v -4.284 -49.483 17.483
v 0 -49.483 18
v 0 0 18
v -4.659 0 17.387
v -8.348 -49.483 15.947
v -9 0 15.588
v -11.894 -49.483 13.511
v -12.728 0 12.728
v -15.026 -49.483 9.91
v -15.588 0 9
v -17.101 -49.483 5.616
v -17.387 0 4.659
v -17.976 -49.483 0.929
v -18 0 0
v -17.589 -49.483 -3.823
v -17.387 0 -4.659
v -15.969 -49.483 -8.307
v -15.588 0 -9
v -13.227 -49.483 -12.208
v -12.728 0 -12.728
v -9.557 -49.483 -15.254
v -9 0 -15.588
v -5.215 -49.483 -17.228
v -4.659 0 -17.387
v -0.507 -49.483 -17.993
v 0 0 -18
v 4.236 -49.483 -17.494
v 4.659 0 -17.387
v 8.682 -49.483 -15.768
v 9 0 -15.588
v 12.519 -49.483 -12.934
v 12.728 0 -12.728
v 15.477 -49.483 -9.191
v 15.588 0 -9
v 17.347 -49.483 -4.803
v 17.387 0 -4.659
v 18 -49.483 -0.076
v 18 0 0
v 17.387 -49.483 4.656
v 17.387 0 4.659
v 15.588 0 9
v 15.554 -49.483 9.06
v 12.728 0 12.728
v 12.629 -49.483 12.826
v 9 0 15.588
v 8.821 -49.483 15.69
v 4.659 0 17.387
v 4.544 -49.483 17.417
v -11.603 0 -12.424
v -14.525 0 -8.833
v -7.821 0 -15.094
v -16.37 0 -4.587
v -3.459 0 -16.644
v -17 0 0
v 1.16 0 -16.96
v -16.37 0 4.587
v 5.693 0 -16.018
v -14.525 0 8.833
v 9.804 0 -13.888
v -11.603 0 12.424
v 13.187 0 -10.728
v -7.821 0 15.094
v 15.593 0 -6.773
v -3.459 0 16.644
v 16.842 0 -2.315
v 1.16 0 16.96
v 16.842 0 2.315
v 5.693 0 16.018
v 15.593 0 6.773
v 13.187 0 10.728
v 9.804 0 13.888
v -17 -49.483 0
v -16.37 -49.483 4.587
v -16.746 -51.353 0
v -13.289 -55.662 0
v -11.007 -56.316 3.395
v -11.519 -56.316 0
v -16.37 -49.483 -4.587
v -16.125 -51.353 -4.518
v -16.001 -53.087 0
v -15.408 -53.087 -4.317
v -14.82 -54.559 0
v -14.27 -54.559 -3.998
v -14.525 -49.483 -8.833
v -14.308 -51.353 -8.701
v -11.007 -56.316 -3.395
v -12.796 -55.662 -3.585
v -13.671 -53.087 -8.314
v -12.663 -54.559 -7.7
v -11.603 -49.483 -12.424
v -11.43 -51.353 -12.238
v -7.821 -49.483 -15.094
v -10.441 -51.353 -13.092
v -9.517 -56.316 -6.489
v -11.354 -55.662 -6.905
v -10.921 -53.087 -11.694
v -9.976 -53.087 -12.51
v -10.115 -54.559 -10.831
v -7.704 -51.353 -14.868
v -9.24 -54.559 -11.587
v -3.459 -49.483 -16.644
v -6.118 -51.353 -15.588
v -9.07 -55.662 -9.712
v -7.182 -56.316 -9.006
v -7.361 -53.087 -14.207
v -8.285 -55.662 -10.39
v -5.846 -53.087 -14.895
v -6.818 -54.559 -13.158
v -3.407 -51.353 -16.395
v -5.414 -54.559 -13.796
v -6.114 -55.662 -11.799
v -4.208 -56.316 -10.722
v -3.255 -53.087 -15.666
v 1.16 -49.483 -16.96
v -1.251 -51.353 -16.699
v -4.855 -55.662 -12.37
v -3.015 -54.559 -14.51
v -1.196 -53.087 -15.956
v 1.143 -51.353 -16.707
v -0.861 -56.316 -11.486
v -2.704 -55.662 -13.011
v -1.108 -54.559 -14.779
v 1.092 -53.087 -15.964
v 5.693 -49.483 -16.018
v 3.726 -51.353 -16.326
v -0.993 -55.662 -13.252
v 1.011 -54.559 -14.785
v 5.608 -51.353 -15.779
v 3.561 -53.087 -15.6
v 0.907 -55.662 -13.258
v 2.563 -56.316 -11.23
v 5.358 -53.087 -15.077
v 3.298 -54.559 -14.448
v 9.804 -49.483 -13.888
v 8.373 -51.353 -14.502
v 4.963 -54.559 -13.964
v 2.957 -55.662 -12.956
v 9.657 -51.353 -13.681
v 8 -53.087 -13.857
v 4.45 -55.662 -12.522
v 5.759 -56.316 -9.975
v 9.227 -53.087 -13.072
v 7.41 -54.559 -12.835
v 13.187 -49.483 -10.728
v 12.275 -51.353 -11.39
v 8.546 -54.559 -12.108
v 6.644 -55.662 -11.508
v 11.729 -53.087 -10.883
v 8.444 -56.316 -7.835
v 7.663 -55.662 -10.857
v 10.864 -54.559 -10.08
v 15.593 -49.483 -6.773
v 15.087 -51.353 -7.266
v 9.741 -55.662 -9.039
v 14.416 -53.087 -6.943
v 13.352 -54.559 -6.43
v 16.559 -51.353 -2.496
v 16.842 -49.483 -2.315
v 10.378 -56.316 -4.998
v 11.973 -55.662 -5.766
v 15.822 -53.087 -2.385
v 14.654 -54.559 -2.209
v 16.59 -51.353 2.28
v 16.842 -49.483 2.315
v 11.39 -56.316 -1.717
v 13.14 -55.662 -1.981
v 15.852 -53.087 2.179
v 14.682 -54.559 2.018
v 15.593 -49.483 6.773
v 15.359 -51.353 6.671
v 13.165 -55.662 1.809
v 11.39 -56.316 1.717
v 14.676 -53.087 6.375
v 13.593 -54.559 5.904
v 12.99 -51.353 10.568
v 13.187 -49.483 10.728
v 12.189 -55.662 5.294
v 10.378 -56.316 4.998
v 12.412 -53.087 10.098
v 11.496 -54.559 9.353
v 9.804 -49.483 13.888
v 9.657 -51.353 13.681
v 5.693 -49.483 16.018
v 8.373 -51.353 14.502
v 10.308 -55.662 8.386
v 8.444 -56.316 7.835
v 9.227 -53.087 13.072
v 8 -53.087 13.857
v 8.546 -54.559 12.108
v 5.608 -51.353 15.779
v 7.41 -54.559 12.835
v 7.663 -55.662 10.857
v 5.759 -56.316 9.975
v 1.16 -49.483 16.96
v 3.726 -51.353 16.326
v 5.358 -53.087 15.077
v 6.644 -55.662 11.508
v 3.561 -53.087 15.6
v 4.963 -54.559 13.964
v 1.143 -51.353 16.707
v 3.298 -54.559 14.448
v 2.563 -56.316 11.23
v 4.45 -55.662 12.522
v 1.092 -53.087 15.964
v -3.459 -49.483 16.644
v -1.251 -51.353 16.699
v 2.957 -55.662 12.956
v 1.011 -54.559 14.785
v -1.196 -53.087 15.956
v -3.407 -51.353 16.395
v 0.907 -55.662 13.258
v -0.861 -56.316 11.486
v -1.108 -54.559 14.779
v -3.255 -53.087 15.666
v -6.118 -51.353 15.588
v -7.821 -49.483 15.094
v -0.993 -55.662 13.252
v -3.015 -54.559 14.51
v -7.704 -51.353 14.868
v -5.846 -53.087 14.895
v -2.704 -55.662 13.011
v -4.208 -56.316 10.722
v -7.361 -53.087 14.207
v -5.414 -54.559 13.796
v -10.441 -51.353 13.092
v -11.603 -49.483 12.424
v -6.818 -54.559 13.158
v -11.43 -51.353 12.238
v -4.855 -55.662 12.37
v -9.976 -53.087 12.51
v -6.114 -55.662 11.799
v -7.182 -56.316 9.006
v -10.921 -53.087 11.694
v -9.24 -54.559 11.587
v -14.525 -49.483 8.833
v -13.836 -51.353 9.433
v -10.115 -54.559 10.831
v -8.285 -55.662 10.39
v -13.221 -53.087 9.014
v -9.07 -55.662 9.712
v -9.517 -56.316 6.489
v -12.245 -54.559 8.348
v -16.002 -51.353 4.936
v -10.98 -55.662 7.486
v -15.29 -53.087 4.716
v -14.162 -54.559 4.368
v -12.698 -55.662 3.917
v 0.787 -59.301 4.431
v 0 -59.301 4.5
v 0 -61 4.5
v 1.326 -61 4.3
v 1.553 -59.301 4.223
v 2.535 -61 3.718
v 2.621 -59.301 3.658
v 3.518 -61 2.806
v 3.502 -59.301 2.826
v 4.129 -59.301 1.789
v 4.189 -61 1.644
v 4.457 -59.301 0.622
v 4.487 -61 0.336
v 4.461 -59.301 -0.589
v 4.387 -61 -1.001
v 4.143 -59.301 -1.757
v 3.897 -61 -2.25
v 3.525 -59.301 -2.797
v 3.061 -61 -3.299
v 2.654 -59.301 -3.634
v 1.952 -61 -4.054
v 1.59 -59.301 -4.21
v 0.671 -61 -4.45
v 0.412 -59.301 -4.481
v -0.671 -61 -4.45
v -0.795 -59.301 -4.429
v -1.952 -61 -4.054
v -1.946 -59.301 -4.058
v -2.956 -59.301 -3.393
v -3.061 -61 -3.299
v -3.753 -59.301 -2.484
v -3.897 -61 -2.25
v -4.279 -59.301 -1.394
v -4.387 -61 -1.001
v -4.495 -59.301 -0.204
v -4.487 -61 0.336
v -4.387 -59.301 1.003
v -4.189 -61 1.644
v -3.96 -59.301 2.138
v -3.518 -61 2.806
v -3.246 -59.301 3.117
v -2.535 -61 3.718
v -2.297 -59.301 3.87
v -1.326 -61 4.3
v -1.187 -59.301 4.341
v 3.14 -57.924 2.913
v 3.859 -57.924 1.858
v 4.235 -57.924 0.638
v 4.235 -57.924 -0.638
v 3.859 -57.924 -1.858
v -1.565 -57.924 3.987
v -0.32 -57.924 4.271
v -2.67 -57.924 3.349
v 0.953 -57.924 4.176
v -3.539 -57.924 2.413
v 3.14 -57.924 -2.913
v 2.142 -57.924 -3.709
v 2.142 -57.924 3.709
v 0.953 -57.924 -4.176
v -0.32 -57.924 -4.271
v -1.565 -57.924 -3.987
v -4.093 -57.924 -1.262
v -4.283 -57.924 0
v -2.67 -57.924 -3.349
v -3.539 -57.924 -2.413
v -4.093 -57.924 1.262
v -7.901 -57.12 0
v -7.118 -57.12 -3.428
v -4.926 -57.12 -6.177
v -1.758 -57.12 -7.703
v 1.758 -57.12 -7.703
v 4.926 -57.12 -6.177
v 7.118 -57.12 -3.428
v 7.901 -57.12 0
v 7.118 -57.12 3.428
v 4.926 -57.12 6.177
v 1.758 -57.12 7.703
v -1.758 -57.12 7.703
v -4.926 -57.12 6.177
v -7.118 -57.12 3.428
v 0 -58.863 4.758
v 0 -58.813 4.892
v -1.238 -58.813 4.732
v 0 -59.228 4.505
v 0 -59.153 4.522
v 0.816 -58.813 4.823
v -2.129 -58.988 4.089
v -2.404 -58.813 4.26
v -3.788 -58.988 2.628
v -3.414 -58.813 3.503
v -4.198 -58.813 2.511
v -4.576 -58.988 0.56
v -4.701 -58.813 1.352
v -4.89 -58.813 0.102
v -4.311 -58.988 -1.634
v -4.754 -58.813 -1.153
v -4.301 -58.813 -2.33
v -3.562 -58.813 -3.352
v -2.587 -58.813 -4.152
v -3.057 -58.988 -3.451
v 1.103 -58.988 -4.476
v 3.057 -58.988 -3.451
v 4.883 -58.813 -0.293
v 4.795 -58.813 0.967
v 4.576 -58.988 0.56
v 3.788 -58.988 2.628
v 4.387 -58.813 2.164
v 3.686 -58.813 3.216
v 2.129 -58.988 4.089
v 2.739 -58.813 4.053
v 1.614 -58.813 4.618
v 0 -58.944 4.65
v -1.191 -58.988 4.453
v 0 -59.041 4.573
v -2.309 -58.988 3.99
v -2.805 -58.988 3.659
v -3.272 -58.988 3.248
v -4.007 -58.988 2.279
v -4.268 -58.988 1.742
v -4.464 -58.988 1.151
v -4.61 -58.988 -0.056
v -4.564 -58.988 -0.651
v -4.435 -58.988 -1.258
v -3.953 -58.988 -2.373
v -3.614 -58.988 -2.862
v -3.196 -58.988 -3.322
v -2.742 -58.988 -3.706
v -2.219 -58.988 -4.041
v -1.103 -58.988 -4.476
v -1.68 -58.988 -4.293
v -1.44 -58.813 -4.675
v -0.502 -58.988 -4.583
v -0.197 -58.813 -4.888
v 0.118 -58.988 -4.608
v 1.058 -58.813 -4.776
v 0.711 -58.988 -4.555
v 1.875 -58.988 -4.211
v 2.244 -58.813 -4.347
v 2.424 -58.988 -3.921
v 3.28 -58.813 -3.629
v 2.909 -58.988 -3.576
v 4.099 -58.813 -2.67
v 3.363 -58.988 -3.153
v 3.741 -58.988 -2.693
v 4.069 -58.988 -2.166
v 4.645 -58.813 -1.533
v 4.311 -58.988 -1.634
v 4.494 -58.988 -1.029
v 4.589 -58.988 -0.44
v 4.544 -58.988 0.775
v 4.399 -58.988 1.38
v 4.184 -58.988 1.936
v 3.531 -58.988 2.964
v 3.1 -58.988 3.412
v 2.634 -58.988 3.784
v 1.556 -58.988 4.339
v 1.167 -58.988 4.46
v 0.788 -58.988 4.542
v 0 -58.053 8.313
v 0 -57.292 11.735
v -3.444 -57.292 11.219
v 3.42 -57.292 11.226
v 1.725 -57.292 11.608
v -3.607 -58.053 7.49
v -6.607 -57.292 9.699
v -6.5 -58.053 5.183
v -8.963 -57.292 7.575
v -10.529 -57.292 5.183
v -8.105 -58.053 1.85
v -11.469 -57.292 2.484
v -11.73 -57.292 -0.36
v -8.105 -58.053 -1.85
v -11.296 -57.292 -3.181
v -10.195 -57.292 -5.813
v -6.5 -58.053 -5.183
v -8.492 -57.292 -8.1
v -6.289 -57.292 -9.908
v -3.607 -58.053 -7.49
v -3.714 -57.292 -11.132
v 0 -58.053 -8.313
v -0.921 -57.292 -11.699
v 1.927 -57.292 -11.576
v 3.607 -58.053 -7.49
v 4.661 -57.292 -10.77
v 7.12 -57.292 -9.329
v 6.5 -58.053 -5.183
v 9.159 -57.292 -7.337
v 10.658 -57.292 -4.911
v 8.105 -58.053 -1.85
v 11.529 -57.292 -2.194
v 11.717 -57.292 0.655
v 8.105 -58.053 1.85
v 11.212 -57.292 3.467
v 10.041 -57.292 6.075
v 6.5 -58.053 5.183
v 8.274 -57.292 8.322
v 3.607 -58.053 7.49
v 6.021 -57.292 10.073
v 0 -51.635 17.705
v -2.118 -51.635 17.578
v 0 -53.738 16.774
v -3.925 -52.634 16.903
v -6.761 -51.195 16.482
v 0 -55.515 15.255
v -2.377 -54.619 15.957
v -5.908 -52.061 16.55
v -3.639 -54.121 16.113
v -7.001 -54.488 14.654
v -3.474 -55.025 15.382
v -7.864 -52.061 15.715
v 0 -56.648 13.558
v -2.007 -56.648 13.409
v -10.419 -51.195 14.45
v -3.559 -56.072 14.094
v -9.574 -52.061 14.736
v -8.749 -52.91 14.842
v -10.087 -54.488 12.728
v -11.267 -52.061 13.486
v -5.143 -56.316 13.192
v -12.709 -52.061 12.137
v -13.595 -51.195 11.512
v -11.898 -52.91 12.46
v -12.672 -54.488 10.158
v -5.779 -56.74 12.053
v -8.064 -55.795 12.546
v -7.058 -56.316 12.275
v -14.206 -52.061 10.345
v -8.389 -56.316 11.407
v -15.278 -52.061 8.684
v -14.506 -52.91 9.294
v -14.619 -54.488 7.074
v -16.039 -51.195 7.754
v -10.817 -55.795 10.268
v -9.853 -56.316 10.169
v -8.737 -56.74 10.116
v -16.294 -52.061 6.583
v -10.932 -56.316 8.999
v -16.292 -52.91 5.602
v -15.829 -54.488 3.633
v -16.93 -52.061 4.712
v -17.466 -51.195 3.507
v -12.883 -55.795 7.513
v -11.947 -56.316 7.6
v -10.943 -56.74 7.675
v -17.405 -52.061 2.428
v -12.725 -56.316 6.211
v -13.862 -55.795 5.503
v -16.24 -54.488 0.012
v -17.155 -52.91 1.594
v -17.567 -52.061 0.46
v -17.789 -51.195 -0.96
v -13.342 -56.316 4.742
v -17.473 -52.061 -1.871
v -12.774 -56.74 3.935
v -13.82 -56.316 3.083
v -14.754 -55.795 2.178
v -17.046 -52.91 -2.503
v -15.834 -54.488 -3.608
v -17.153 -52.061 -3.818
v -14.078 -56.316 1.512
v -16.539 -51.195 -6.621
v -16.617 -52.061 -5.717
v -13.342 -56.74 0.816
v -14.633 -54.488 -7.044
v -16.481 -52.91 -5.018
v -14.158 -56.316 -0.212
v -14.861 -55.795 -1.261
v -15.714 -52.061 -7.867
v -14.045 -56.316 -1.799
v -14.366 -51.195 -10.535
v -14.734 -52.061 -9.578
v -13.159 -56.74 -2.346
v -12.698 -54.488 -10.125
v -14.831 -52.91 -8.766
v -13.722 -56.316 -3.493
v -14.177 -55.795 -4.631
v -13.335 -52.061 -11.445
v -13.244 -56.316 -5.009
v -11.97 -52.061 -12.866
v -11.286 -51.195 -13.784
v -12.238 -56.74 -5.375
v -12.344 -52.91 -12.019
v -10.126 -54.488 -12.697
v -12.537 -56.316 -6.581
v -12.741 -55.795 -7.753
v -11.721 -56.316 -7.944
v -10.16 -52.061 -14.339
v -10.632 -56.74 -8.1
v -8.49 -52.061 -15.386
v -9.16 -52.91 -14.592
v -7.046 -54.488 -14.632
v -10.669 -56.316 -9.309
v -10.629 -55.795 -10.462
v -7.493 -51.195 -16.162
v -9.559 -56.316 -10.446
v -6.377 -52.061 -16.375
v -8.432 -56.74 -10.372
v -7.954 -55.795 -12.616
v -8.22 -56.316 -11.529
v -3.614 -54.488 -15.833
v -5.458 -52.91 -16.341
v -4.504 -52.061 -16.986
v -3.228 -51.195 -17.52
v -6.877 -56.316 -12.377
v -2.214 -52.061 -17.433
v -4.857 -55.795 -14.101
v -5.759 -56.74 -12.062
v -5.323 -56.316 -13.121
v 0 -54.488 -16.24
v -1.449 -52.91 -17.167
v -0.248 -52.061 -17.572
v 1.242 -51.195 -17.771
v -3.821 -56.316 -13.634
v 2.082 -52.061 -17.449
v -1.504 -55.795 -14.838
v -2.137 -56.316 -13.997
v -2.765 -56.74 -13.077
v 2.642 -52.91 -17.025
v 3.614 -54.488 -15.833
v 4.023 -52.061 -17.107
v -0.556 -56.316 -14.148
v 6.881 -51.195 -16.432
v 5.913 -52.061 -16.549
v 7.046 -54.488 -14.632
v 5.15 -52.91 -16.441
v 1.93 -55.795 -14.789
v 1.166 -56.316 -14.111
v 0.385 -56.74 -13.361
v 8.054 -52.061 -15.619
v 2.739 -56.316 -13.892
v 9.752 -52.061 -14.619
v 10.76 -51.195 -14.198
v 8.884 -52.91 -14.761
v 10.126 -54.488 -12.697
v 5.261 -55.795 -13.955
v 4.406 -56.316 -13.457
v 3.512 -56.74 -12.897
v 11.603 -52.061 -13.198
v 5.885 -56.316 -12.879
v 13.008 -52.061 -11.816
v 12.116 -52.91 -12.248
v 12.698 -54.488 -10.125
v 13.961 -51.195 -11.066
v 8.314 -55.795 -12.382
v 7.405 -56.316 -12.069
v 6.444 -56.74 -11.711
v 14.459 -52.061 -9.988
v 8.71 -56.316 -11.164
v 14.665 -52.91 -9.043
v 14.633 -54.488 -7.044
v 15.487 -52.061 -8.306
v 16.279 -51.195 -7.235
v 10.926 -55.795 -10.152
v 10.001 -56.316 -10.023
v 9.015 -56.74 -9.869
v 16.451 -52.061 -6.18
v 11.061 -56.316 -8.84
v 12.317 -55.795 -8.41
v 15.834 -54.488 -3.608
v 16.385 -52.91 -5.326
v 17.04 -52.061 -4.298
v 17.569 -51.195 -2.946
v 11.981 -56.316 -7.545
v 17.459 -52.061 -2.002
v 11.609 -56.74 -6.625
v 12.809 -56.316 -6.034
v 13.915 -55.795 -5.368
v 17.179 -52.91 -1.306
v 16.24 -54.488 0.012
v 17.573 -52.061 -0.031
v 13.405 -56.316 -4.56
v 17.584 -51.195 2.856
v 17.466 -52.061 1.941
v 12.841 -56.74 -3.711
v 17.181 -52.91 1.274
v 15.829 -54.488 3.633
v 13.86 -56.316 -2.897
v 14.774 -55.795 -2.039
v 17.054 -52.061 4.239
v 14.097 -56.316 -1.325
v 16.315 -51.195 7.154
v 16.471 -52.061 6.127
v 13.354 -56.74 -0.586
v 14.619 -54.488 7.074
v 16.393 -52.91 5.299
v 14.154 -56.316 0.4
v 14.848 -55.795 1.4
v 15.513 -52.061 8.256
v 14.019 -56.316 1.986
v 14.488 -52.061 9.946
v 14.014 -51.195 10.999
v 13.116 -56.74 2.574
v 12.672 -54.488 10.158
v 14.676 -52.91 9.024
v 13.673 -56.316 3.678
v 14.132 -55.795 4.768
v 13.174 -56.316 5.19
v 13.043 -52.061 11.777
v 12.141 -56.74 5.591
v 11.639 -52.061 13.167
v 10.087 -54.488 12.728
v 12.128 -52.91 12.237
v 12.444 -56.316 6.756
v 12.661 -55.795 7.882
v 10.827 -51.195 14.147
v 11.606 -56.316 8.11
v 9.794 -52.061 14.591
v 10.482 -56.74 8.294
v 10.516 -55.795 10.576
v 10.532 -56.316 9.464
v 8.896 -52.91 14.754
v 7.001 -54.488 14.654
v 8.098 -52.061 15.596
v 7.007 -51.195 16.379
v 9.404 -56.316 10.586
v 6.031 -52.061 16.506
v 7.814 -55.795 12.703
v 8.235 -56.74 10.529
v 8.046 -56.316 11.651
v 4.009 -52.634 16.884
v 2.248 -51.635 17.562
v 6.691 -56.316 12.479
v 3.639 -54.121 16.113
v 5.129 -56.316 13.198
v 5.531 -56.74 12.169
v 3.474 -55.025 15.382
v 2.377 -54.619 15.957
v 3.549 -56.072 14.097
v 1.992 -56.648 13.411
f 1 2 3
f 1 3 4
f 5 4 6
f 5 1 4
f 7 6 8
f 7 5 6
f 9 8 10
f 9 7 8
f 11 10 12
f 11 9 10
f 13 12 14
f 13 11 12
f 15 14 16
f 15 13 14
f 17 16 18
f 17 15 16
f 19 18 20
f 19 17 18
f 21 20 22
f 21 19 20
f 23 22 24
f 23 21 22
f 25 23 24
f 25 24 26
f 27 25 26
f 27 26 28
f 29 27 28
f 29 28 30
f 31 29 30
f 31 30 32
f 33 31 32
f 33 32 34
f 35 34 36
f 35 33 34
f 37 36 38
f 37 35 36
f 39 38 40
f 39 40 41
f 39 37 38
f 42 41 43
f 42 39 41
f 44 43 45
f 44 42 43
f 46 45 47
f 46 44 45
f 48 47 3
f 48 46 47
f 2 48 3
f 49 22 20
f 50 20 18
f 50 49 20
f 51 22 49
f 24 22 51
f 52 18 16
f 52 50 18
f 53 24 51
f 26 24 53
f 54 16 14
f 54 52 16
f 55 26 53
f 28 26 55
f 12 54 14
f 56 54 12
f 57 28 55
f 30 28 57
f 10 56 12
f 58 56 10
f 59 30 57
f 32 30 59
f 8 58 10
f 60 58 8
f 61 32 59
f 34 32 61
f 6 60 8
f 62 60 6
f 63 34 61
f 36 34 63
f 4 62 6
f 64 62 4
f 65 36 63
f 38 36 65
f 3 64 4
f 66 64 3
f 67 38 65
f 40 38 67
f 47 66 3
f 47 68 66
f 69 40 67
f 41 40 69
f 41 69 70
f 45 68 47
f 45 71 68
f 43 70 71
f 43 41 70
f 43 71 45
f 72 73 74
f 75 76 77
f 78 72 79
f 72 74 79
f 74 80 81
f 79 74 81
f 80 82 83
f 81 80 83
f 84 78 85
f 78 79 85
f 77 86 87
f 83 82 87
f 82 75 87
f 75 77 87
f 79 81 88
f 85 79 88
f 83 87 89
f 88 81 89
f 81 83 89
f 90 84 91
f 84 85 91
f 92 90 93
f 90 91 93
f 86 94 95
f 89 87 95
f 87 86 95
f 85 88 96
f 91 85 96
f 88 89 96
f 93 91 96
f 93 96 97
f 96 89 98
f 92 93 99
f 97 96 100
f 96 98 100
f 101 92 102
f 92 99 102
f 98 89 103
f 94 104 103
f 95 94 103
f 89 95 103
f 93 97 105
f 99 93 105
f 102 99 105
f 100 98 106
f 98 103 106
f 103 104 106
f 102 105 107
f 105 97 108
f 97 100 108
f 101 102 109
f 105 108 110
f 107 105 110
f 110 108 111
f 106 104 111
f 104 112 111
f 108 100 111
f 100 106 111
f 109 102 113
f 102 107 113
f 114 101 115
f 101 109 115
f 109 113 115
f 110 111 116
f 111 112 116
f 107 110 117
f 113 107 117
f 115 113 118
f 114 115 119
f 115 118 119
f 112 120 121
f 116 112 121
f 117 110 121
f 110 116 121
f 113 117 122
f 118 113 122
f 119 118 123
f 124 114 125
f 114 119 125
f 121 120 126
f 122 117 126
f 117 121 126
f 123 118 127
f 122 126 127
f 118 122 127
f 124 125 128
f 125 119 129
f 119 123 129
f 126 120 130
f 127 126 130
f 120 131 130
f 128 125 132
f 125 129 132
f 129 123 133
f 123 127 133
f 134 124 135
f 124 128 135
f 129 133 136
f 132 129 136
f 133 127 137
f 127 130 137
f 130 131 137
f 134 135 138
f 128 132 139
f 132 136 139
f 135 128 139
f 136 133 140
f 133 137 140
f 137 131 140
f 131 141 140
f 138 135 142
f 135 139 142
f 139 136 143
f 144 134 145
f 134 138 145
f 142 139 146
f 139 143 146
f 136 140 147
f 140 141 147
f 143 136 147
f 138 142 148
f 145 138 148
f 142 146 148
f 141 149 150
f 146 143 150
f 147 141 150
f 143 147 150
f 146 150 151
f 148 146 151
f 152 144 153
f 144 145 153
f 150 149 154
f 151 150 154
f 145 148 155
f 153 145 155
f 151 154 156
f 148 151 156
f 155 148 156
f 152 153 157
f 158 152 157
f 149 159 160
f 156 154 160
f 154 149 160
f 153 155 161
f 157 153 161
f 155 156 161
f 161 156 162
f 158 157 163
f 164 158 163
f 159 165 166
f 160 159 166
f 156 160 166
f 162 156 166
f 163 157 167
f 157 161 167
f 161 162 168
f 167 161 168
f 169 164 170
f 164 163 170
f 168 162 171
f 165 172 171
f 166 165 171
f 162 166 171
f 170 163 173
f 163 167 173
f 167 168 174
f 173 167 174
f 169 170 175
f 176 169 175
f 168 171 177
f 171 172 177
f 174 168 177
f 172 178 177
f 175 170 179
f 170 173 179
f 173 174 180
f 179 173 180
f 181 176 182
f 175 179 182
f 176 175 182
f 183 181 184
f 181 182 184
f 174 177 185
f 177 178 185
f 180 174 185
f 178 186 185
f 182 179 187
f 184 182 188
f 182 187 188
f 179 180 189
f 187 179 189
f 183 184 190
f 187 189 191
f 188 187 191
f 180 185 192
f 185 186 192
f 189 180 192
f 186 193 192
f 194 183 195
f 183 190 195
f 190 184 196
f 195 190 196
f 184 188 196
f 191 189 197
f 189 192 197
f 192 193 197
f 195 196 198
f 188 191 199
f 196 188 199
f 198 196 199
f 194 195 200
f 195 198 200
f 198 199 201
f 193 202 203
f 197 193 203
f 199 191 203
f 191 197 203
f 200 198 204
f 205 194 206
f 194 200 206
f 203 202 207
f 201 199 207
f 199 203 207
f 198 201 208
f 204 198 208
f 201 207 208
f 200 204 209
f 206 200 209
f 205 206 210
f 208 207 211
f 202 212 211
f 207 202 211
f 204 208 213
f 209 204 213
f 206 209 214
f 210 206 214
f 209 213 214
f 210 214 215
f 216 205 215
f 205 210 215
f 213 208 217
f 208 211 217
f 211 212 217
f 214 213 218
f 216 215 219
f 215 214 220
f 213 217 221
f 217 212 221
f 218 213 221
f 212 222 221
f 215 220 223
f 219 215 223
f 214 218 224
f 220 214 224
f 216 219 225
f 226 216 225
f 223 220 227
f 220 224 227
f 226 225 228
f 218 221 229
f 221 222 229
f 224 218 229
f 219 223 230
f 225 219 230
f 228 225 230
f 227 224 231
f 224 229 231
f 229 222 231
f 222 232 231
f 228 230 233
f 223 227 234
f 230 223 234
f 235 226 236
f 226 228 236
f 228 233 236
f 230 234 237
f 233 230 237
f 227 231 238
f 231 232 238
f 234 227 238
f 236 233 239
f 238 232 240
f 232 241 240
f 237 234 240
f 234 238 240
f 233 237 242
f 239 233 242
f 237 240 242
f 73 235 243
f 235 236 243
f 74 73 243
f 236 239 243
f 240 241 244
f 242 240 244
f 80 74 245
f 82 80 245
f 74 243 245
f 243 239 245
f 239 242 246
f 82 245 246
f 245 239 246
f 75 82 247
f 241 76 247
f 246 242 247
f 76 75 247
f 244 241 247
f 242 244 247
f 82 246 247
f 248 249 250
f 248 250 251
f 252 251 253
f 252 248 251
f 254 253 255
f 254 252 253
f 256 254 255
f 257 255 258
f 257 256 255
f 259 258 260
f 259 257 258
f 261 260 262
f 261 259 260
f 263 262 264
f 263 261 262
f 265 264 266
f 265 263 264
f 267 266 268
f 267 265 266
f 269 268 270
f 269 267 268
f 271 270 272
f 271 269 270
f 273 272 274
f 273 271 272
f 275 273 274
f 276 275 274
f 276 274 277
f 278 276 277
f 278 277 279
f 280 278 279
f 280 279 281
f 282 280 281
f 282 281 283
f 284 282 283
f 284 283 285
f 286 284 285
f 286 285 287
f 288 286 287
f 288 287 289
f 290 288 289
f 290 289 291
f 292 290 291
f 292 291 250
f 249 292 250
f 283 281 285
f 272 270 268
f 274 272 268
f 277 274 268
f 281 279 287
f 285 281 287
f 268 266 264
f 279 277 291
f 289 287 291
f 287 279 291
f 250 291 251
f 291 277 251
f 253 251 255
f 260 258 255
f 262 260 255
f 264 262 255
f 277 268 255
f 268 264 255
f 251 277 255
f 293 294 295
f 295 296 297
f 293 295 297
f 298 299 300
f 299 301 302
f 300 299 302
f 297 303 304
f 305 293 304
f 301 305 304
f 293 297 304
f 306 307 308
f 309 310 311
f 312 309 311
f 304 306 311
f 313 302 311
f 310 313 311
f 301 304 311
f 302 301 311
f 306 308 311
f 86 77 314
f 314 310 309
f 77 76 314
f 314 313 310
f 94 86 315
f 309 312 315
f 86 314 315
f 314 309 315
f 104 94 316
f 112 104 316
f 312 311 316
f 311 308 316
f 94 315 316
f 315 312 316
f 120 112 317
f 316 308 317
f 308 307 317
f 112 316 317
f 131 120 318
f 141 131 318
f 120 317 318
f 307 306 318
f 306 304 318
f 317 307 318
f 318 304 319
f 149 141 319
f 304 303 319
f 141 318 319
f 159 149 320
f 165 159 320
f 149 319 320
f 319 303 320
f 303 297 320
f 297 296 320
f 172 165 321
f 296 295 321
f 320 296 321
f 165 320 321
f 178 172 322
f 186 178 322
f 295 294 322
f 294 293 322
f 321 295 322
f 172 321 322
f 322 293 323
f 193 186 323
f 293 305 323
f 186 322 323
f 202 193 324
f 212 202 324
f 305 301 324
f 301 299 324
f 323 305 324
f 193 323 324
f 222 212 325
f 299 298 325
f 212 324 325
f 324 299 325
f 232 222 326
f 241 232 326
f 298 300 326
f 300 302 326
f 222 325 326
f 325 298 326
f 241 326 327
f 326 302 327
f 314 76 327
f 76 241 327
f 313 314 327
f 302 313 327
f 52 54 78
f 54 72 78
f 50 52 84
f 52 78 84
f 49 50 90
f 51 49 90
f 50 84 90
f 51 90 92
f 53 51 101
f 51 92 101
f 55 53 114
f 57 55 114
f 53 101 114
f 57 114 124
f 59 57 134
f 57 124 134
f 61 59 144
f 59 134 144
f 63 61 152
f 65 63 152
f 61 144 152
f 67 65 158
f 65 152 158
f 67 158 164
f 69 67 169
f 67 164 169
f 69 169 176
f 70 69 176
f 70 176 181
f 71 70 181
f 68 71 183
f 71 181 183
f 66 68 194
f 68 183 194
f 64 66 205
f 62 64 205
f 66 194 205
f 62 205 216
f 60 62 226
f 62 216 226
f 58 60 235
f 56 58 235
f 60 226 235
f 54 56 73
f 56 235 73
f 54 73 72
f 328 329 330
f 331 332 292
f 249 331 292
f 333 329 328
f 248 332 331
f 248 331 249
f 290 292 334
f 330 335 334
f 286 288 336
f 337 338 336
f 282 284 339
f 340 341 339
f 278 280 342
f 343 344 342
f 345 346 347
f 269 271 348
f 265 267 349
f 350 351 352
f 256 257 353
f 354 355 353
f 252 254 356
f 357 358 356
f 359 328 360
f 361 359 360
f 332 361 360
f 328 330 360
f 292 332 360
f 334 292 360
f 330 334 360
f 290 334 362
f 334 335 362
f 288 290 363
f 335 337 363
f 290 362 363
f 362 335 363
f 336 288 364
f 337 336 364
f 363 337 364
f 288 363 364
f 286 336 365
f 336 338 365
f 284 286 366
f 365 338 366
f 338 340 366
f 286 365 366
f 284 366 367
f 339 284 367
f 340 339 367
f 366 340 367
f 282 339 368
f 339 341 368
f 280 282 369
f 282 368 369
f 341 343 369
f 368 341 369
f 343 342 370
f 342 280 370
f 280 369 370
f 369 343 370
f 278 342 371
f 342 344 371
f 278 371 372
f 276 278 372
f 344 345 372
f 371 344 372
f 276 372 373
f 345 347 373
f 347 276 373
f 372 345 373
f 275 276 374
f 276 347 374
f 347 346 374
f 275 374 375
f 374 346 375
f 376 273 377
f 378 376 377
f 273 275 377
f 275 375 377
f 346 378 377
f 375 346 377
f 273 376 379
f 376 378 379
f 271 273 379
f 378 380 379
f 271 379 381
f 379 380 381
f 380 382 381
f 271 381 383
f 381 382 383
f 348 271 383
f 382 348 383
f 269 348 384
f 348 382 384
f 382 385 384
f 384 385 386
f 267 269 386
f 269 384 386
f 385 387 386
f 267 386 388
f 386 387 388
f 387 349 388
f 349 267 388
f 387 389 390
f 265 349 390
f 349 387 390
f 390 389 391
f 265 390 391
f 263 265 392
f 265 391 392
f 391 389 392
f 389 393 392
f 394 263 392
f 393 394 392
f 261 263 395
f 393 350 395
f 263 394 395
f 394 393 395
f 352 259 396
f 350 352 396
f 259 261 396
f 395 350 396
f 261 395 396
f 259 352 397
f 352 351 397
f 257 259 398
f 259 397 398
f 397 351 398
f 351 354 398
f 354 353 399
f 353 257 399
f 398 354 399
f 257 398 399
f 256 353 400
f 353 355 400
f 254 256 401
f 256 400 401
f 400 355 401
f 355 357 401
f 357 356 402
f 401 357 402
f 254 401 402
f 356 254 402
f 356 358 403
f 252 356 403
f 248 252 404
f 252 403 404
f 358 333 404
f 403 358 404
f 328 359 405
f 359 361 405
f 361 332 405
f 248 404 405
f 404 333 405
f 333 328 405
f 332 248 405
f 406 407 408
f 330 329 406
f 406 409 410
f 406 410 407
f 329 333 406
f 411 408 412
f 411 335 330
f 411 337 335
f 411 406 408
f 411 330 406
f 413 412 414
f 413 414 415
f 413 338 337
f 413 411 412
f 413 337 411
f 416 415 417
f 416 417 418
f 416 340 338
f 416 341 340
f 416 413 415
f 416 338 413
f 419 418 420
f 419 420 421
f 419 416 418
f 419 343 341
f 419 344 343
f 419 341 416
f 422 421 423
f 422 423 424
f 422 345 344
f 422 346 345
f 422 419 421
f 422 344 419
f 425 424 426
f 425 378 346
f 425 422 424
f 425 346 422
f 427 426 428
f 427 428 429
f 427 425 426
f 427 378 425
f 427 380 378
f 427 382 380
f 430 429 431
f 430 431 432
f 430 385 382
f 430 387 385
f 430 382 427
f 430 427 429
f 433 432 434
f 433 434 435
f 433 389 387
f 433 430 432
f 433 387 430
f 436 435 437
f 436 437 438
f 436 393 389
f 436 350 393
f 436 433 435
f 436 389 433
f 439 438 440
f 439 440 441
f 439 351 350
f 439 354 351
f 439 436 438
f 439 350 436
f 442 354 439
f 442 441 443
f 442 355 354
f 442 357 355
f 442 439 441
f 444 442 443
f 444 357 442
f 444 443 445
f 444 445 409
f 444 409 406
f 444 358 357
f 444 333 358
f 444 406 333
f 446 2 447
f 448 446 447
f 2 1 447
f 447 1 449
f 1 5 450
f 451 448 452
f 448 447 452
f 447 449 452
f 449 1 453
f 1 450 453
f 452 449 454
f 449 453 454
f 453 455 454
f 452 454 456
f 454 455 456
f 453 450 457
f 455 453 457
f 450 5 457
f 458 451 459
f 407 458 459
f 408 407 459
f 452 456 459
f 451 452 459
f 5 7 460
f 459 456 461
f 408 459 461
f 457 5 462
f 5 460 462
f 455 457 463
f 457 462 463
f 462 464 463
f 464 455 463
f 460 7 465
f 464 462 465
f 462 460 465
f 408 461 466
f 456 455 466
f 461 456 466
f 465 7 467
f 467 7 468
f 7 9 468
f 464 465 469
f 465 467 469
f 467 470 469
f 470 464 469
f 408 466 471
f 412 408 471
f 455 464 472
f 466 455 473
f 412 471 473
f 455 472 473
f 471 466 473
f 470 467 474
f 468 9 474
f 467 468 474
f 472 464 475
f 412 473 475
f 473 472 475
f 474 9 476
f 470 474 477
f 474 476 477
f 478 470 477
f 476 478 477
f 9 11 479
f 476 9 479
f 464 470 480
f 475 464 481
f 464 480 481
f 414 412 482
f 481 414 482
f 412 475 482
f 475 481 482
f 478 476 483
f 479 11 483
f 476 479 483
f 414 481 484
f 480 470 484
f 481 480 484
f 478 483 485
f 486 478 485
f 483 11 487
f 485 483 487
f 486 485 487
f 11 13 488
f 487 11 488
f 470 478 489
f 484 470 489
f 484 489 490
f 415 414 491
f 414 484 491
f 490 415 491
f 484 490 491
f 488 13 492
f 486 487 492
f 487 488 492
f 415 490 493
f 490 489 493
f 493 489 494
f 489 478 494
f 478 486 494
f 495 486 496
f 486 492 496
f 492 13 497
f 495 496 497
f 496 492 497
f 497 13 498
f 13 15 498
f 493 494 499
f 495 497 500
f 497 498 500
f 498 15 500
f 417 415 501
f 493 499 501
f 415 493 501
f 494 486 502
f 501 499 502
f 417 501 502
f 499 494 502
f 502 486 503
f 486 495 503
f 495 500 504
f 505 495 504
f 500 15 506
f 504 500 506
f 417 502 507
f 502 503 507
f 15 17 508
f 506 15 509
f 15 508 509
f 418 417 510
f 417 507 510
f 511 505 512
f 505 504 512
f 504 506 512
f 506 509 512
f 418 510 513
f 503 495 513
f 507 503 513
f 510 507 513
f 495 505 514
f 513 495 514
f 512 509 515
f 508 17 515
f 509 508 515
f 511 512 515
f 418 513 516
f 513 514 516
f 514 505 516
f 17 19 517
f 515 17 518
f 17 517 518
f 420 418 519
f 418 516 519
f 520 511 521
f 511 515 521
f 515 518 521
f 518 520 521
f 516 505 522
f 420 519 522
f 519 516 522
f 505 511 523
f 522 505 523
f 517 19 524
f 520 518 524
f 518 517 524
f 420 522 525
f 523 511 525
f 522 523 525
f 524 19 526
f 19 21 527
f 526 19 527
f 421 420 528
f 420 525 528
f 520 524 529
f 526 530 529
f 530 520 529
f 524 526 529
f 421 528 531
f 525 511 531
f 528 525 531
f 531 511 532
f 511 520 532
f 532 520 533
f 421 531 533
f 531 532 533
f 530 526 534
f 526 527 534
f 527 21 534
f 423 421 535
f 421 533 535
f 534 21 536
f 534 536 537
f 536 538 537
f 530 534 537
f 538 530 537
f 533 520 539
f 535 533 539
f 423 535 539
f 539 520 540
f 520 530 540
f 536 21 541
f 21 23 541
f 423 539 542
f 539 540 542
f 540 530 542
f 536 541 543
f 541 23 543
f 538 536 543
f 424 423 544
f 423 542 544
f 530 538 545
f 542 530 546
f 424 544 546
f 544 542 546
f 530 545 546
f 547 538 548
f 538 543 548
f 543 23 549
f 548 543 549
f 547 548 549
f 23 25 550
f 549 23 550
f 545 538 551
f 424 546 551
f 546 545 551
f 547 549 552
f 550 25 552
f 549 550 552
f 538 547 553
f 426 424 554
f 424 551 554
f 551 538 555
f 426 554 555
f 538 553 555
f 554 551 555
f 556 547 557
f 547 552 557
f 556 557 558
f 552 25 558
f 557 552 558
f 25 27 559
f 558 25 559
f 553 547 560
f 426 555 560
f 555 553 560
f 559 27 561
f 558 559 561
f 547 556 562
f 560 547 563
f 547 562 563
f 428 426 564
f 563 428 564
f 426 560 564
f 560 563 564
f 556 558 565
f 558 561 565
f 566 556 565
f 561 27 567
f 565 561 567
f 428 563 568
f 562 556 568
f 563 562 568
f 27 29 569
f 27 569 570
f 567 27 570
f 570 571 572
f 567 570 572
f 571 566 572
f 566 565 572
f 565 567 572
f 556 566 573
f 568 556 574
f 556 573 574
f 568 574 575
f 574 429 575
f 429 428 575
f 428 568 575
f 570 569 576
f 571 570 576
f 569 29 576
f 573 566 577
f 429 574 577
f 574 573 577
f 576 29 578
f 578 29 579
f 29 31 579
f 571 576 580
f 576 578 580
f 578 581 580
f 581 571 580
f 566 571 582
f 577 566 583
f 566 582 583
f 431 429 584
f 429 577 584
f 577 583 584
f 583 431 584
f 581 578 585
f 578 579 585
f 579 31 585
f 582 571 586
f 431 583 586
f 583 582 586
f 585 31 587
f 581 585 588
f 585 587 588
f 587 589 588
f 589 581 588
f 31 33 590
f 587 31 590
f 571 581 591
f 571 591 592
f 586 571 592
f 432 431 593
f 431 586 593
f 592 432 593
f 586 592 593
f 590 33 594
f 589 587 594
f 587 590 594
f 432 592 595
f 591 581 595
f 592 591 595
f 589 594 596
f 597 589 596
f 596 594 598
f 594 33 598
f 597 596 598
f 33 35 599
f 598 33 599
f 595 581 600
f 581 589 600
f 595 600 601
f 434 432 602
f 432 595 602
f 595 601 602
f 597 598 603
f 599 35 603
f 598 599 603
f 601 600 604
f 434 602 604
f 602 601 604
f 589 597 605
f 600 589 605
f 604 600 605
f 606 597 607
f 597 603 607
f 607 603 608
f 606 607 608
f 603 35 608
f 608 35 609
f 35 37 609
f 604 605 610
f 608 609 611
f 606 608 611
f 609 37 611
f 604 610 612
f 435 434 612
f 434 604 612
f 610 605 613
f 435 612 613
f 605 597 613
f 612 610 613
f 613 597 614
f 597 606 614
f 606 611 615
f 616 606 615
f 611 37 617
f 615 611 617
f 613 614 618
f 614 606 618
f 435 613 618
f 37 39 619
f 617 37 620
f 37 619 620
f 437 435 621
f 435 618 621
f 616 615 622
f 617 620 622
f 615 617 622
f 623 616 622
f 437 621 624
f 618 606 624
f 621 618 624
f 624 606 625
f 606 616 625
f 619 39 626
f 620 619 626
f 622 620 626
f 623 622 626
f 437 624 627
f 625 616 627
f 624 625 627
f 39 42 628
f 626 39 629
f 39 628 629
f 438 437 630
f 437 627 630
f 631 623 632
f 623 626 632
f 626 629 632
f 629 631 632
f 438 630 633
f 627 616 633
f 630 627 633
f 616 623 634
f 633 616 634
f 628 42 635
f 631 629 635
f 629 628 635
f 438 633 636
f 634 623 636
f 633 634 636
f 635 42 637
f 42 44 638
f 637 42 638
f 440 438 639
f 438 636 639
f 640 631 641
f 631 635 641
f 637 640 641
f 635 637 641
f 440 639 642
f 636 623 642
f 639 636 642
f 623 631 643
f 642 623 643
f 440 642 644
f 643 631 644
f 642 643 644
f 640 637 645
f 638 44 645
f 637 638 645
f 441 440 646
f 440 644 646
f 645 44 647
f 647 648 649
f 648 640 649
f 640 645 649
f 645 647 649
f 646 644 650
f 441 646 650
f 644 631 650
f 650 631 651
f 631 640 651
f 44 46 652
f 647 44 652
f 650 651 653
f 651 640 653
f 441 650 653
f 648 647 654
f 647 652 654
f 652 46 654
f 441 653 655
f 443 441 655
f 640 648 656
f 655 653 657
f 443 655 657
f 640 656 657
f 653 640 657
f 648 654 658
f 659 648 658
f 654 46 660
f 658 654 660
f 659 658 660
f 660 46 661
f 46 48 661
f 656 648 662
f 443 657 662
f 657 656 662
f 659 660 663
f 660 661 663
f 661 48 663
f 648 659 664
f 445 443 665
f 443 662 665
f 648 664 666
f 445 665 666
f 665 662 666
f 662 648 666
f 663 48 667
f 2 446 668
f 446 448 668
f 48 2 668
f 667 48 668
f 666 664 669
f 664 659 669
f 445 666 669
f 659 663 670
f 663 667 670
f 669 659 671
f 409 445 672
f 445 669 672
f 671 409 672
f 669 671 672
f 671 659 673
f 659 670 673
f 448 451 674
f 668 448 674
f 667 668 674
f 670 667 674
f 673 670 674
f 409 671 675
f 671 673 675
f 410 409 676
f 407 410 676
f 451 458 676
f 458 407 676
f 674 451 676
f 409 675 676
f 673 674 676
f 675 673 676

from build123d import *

# Parameters (mm, degrees)
NECK_SKETCH_R = 4.5
NECK_DEPTH    = 61
TOP_ROUND_R   = 8
BLEND_R       = 0.5


with BuildPart() as part:
    # Outside Profile_Sketch → Outside Profile (revolve)
    with BuildSketch(Plane.XY):
        Polygon((0, 0), (-18, 0), (-18, -55.9), (-4.5, -58.9), (0, -58.9), align=None)
    revolve(axis=Axis((0, 0, 0), (0, -1, 0)))

    # Neck_Sketch → Neck (add)
    with BuildSketch(Plane(origin=(0, 0, 0), x_dir=(1, 0, 0), z_dir=(0, 1, 0))):
        Circle(NECK_SKETCH_R)
    extrude(amount=-NECK_DEPTH)

    # Top Round
    top_round_edges = [part.edges().sort_by_distance(p)[0] for p in [
        (18, -55.9, 0),
    ]]
    fillet(top_round_edges, radius=TOP_ROUND_R)

    # Blend
    blend_edges = [part.edges().sort_by_distance(p)[0] for p in [
        (0, -58.9, -4.5),
    ]]
    fillet(blend_edges, radius=BLEND_R)

    # Shell_Sketch → Shell (revolve, cut)
    with BuildSketch(Plane.XY):
        with BuildLine():
            Line((-4.283069542, -57.92381294), (0, -57.92381294))
            Line((0, -57.92381294), (0, 0))
            Line((0, 0), (-17, 0))
            Line((-17, 0), (-17, -49.482627149))
            ThreePointArc((-17, -49.482627149), (-15.460292686, -53.862718904), (-11.518513205, -56.31593657))
            Line((-11.518513205, -56.31593657), (-4.283069542, -57.92381294))
        make_face()
    revolve(axis=Axis((0, 0, 0), (0, -1, 0)), mode=Mode.SUBTRACT)


solid = part.part
